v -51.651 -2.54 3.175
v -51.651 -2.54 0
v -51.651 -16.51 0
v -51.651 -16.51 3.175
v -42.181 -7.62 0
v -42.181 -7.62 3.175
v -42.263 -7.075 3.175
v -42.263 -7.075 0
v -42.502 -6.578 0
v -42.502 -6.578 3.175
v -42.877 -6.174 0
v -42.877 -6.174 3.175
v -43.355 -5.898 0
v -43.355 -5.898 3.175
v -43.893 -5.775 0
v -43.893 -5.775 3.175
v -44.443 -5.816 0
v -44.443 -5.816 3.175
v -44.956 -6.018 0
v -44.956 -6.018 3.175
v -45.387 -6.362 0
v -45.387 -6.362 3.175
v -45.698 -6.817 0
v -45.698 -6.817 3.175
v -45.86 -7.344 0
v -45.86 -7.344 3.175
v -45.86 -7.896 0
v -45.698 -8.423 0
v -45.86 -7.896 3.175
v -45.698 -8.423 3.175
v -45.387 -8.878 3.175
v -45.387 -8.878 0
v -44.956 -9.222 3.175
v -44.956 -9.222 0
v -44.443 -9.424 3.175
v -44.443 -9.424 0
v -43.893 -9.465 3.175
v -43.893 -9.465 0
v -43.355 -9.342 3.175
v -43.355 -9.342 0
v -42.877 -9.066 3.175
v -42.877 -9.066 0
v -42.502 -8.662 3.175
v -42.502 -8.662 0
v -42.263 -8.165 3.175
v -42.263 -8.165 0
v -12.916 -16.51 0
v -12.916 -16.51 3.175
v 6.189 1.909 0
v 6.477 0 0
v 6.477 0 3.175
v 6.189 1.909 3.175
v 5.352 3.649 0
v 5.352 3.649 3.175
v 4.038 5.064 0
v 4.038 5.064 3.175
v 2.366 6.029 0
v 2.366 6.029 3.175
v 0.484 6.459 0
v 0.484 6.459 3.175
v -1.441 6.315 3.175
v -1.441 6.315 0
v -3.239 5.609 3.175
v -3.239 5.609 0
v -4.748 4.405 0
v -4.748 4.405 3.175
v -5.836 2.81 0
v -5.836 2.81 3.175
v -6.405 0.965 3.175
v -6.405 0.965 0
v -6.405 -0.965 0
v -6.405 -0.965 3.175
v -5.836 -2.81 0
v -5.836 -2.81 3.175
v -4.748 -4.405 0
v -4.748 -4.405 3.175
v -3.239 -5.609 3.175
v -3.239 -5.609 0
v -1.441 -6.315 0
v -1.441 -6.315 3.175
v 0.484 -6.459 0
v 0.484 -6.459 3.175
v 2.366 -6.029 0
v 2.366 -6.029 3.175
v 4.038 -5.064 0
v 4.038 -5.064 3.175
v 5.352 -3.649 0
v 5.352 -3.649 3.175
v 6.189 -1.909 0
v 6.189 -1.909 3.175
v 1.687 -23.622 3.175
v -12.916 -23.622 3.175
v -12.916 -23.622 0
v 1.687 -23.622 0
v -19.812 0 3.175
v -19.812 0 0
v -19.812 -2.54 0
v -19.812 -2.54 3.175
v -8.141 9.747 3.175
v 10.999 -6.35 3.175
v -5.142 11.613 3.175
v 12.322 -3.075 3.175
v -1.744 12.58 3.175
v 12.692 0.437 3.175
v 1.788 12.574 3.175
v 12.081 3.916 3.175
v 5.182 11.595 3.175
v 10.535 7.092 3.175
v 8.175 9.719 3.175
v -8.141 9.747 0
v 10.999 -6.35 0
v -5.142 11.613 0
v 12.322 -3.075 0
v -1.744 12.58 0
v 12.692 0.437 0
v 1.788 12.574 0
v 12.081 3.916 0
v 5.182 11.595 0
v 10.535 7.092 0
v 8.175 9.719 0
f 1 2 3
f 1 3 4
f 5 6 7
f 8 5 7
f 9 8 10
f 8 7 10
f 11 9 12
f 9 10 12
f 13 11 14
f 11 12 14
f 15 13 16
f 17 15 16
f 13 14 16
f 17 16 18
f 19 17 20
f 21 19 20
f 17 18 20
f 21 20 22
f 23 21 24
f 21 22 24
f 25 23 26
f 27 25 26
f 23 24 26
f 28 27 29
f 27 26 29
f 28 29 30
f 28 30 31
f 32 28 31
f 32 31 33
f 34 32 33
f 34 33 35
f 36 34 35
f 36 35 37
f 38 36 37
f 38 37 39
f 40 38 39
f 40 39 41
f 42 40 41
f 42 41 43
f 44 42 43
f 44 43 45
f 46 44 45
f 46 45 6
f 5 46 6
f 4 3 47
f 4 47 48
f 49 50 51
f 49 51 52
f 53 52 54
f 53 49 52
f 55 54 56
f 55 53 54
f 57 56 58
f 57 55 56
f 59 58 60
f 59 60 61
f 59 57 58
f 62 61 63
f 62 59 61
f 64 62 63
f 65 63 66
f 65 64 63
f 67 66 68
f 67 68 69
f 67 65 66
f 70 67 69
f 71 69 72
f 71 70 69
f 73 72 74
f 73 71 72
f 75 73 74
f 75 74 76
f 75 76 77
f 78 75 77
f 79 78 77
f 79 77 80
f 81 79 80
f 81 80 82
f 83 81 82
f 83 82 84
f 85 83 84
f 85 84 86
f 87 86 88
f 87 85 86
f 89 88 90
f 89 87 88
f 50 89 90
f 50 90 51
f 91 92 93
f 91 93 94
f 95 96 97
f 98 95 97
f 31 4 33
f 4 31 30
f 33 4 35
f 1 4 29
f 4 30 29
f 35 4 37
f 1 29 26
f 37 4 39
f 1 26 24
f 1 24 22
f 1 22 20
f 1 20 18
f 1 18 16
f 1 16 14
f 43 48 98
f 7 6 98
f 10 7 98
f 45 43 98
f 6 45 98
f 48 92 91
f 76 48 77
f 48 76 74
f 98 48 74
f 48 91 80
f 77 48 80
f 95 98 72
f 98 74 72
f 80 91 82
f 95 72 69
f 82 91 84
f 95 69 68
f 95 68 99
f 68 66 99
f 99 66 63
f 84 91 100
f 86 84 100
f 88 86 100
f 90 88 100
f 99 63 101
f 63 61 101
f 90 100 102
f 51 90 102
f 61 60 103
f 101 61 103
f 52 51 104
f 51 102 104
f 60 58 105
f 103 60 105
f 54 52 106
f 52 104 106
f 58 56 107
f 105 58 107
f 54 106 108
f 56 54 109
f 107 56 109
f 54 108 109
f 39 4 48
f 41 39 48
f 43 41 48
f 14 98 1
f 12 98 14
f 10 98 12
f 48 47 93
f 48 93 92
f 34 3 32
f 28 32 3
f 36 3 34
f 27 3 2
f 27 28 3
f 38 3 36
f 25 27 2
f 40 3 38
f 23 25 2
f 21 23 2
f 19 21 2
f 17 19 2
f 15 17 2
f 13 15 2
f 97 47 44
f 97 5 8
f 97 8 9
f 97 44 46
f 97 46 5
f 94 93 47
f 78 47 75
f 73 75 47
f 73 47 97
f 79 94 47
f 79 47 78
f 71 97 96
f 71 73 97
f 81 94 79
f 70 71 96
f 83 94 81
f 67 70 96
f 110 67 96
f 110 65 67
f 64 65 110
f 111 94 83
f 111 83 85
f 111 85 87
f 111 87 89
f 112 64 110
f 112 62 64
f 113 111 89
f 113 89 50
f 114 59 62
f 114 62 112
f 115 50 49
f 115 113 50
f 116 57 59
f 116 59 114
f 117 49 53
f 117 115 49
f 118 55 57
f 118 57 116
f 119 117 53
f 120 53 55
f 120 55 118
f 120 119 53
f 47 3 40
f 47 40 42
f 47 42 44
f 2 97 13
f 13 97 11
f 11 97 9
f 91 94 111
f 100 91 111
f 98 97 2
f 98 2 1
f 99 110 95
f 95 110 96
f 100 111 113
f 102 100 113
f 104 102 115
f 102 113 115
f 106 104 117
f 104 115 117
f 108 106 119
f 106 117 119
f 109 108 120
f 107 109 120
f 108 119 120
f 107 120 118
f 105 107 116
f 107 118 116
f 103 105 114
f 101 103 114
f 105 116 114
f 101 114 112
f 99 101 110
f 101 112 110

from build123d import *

# Parameters (mm, degrees)
SKETCH1_R                = 6.477
BOSS_EXTRUDE1_DEPTH      = 3.175
CUT_EXTRUDE1_REACH       = 71.794
SKETCH2_W                = 36.544437467
SKETCH2_H                = 39.878
SKETCH3_W                = 3.175
SKETCH3_H                = 13.97
BOSS_EXTRUDE2_DEPTH      = 22.86
M3_CLEARANCE_HOLE1_D     = 3.7
M3_CLEARANCE_HOLE1_DEPTH = 25.4
M3_CLEARANCE_HOLE1_TIP   = 1.111592145
SKETCH7_W                = 3.175
SKETCH7_H                = 7.112
CUT_EXTRUDE2_DEPTH       = 15.875


with BuildPart() as part:
    # Sketch1 → Boss-Extrude1 (new body)
    with BuildSketch(Plane.XY):
        with BuildLine():
            Line((-8.141025641, 9.747497192), (-19.812, 0))
            Line((-19.812, 0), (-19.812, -2.54))
            Line((-19.812, -2.54), (-28.7909, -2.54))
            Line((-28.7909, -2.54), (-28.7909, -63.5))
            Line((-28.7909, -63.5), (-19.812, -63.5))
            Line((-19.812, -63.5), (10.998522628, -6.35))
            ThreePointArc((10.998522628, -6.35), (8.174574987, 9.719378775), (-8.141025641, 9.747497192))
        make_face()
        Circle(SKETCH1_R, mode=Mode.SUBTRACT)
    extrude(amount=BOSS_EXTRUDE1_DEPTH)

    # Sketch2 → Cut-Extrude1 (cut, up to next)
    with BuildSketch(Plane.XY.offset(3.175), mode=Mode.PRIVATE) as cut_extrude1_sk1:
        with Locations((-10.518681266, -43.561)):
            Rectangle(SKETCH2_W, SKETCH2_H)
    cut_extrude1_tool1 = extrude(cut_extrude1_sk1.sketch, amount=-CUT_EXTRUDE1_REACH, mode=Mode.PRIVATE) & part.part
    add(cut_extrude1_tool1.solids().sort_by_distance((-10.518681, -43.561, 3.175))[0], mode=Mode.SUBTRACT)

    # Sketch3 → Boss-Extrude2 (add)
    with BuildSketch(Plane.ZY.offset(28.7909)):
        with Locations((1.5875, -9.525)):
            Rectangle(SKETCH3_W, SKETCH3_H)
    extrude(amount=BOSS_EXTRUDE2_DEPTH)

    # M3 Clearance Hole1
    with Locations(Plane(origin=(0, 0, 0), x_dir=(-1, 0, 0), z_dir=(0, 0, -1))):
        with Locations((44.0309, -7.62)):
            Hole(M3_CLEARANCE_HOLE1_D / 2, depth=M3_CLEARANCE_HOLE1_DEPTH)
            with Locations((0, 0, -(M3_CLEARANCE_HOLE1_DEPTH + M3_CLEARANCE_HOLE1_TIP / 2))):  # 118° drill point
                Cone(0, M3_CLEARANCE_HOLE1_D / 2, M3_CLEARANCE_HOLE1_TIP, mode=Mode.SUBTRACT)

    # Sketch7 → Cut-Extrude2 (cut)
    with BuildSketch(Plane.ZY.offset(28.7909)):
        with Locations((1.5875, -20.066)):
            Rectangle(SKETCH7_W, SKETCH7_H)
    extrude(amount=-CUT_EXTRUDE2_DEPTH, mode=Mode.SUBTRACT)


solid = part.part
